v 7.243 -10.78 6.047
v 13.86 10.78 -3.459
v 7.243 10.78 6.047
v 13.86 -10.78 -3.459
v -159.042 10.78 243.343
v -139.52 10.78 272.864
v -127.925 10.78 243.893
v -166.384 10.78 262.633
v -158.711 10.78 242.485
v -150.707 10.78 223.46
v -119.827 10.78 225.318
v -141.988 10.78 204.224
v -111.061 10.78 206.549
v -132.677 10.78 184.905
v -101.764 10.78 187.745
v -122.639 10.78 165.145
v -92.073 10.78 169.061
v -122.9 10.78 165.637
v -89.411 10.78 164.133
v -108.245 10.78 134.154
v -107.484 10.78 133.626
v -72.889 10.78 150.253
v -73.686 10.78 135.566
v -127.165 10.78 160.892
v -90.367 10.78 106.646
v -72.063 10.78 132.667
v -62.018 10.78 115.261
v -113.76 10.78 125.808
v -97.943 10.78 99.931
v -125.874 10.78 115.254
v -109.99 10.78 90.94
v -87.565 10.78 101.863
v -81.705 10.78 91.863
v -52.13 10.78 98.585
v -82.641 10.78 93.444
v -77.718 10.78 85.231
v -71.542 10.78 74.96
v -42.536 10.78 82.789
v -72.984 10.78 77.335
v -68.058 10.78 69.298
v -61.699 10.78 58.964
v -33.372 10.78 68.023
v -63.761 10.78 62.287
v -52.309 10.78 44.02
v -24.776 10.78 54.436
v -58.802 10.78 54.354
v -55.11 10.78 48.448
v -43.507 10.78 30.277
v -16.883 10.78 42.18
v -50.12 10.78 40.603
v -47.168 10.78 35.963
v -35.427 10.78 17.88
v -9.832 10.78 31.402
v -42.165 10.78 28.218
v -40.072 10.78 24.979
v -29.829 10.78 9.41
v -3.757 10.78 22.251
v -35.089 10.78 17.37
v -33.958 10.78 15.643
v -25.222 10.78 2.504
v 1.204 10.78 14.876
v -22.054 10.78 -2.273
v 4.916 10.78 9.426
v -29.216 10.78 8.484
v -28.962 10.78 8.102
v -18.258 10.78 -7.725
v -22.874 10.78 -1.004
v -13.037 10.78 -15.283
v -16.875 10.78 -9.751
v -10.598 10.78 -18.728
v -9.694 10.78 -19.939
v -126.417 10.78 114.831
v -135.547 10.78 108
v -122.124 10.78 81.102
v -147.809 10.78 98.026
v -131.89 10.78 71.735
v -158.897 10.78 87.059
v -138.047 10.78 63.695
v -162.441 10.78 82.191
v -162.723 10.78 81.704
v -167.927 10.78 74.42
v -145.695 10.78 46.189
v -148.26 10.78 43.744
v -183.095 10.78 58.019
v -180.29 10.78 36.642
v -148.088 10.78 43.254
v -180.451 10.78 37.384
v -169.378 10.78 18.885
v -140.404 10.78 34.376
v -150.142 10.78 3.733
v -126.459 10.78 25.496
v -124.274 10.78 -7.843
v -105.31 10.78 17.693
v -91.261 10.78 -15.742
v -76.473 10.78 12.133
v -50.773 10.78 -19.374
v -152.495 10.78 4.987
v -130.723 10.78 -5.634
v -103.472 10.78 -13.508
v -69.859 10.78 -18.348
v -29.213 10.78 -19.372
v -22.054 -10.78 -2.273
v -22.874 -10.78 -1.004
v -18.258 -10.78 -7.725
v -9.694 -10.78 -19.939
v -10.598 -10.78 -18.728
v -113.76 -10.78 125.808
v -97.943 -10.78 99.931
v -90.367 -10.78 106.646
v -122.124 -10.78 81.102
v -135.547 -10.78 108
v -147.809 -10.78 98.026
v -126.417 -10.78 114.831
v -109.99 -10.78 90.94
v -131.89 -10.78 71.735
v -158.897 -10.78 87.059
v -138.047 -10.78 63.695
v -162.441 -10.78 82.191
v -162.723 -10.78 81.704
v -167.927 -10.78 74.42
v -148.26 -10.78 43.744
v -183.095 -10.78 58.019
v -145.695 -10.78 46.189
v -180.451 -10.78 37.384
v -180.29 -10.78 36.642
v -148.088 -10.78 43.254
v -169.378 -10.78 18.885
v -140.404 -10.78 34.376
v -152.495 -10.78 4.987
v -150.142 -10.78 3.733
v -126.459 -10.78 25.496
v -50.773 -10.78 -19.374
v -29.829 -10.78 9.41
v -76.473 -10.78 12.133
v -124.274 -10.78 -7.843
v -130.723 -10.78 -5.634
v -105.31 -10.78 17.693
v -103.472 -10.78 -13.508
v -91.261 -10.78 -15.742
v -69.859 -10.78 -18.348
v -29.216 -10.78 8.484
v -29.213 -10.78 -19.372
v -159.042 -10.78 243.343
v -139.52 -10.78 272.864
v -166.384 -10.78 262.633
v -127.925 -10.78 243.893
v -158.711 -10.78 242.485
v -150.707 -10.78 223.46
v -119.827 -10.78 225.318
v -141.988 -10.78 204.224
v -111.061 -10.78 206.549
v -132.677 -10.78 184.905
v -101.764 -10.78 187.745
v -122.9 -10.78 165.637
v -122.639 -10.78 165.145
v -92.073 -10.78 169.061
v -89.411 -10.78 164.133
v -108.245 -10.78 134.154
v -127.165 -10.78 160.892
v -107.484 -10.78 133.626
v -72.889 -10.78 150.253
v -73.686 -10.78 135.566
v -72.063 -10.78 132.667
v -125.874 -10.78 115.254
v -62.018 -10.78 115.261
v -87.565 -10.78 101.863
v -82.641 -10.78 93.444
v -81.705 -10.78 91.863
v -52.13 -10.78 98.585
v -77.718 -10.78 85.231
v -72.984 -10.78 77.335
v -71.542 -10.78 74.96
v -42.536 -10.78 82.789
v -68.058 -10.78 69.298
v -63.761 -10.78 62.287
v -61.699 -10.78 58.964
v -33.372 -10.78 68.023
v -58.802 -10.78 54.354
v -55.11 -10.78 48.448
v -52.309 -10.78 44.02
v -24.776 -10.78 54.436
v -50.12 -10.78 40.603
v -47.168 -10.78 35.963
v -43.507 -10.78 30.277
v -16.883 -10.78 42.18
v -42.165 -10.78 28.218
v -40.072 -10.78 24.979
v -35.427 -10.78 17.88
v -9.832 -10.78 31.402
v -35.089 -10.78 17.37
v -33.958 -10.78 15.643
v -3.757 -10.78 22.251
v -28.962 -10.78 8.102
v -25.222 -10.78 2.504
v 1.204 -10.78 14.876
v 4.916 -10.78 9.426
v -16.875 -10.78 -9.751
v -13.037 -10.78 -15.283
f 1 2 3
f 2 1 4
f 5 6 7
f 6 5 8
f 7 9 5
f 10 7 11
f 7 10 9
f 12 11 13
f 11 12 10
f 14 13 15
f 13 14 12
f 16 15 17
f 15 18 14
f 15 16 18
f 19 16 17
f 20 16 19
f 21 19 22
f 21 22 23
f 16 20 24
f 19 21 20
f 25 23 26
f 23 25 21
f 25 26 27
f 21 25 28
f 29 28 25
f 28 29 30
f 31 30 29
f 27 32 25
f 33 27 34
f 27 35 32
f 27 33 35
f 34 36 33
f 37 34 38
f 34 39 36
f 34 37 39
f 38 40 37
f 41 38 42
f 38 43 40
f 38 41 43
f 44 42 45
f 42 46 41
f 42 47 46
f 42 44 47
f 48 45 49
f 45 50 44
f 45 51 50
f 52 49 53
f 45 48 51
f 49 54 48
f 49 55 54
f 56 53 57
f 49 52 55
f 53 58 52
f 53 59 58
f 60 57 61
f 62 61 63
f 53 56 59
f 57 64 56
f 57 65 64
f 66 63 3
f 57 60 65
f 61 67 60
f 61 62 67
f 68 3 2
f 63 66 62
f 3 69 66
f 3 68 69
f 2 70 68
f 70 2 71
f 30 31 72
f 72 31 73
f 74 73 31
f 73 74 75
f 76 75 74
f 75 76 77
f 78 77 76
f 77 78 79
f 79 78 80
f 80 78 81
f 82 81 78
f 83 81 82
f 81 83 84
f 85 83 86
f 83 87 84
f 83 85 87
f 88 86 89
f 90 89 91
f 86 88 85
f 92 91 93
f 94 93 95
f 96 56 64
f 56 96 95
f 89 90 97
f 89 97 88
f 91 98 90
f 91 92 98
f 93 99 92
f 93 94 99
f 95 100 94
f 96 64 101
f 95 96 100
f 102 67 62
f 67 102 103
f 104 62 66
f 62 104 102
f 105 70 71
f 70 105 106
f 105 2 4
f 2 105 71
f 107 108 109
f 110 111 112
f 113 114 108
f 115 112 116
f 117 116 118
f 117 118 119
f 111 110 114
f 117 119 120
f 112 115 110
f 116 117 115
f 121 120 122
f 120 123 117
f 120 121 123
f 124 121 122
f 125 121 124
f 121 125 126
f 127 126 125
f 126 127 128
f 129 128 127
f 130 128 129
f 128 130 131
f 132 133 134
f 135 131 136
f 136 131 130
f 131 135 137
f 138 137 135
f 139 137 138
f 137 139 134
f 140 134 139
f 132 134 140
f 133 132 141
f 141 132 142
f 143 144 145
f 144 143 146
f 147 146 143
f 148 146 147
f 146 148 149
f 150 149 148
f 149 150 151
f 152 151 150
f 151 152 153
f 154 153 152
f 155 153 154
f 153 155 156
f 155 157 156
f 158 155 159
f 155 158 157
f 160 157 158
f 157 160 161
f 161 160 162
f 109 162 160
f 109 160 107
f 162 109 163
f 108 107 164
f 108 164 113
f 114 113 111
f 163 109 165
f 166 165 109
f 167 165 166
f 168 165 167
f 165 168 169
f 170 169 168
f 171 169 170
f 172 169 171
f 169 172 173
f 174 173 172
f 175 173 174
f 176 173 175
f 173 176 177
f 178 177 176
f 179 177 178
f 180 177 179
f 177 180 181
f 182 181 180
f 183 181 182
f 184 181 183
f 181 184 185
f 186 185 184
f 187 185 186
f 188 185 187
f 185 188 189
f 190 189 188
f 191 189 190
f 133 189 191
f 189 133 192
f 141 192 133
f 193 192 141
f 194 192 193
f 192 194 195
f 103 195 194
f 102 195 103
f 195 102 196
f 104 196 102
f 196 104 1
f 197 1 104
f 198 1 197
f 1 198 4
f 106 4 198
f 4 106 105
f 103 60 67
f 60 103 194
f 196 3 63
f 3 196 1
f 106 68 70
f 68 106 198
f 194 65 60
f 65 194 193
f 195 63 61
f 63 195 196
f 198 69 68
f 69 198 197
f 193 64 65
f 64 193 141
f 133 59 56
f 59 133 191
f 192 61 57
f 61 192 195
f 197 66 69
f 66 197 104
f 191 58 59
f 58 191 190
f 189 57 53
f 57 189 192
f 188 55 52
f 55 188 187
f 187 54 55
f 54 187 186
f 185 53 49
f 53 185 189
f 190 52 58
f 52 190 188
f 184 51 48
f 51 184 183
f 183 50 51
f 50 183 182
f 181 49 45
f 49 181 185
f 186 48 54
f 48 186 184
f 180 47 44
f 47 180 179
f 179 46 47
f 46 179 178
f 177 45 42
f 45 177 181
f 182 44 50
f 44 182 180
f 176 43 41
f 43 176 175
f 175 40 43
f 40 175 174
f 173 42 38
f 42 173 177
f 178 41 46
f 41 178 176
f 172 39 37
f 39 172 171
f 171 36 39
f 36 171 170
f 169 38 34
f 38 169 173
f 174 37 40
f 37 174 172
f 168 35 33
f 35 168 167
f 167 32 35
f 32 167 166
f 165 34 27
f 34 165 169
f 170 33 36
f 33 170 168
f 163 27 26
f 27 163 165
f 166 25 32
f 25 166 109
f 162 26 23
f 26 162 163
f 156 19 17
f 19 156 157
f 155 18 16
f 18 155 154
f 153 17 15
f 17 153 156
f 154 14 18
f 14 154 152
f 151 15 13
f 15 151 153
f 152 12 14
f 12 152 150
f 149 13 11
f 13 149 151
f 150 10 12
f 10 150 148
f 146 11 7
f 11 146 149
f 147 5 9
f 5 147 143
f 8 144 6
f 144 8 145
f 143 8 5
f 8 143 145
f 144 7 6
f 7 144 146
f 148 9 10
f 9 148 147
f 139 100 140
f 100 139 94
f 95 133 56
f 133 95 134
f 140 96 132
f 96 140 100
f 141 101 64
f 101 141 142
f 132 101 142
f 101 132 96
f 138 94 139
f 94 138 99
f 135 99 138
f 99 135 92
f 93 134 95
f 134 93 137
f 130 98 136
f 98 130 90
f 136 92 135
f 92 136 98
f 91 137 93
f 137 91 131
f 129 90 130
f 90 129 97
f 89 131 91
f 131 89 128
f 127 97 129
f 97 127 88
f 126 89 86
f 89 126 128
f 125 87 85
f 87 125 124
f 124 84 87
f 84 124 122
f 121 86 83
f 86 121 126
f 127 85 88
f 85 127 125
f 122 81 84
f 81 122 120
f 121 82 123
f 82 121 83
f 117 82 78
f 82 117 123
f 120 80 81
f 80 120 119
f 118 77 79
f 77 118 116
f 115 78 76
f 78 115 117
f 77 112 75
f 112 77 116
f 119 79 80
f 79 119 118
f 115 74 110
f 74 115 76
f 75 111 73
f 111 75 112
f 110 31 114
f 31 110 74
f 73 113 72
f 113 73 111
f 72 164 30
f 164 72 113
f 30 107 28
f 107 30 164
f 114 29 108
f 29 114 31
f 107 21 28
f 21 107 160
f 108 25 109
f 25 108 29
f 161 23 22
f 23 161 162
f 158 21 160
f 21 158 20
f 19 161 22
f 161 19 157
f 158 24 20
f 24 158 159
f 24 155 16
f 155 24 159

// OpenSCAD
// No Preview. Just hit Create.   Always leave Part at 1"
part=1;//[1,2,3,4,5,6]
/* [Hidden] */
LOA=rnd(900,2000);
Stern=LOA*rnd(-0.1,0.3);
Bow=LOA*rnd(-0.1,0.3);
Beam=LOA*rnd(0.05,0.3);
BeamHeight=min(Beam*rnd(0.4,1),LOA*0.1);
SternHeight=BeamHeight*rnd(0.9,3);
BowHeight=max(SternHeight*rnd(0.9,2),BeamHeight*rnd(0.9,3));;

KeelBase=LOA-Stern-Beam;
KeelLine=[
[0,0,0], 
[KeelBase*rnd(0.0,0.3),0,-KeelBase*rnd(-0.1,0.1)], 
[KeelBase*rnd(0.3,0.6),0,-KeelBase*rnd(-0.1,0.1)],
[KeelBase*rnd(0.6,0.9),0,-KeelBase*rnd(-0.1,0.1)],
[KeelBase-1,0,0],
[KeelBase-1,0,0]];
BottomLine=[
[0,0,0],
[KeelBase*rnd(0,0.3),Beam*rnd(0.1,1.5),1],
[KeelBase*rnd(0.3,0.6),Beam*rnd(0.1,2),1],
[KeelBase*rnd(0.6,0.9),Beam*rnd(0.1,3),1],
[KeelBase,0,1],
[KeelBase,0,1]];
bowbend=rnd(-1,3);
WaterLine=[
[-Stern*rnd(0.1,0.9),0,SternHeight/2],
[-Stern*rnd(0.1,0.9),Beam*rnd(0.5,2),SternHeight/2],
[KeelBase*rnd(0,2),Beam*rnd(0.5,3),BeamHeight/2],
[KeelBase+Bow*bowbend,0,BowHeight/2],
[KeelBase+Bow*bowbend,0,BowHeight/2]];
beamstern=[-Stern*rnd(-0.1,1),0,SternHeight];
BeamLine=[
beamstern,
[beamstern[0]+Beam*rnd(0,1),Beam*rnd(0.15,1.5),(BeamHeight+SternHeight)/2],
[KeelBase*rnd(0.0,0.5),Beam*rnd(0.15,2),BeamHeight],
[(KeelBase+Bow)*rnd(0.5,1),Beam*rnd(0.15,2),(BeamHeight+BowHeight)/2],
[KeelBase+Bow,0,BowHeight],
[KeelBase+Bow,0,BowHeight]];
KeelBow=concat(
[
BottomLine[len(BottomLine)-1],
WaterLine[len(WaterLine)-1],
BeamLine[len(BeamLine)-1]]);

SternLine=[BeamLine[0],WaterLine[0],BottomLine[0],KeelLine[0]];
RudderLine=[(WaterLine[0]+BeamLine[0])/2,WaterLine[0],WaterLine[0]-[LOA*rnd(0.03,0.2),0,0],BottomLine[0]-[LOA*rnd(0.03,0.2),0,0],KeelLine[0]-[LOA*rnd(0.01,0.03),0,0]];
tiny=[0.0001,0.0001,0.0001];
Clinked=rnd(0,1);
openhull=sign(rnd(-1,1));
nummasts= floor(rnd(0,4));
////////////////////////////////////////////////////////////////////////////////////////////////////////////////////////////////////////////////////////



  union(){
 masts(nummasts);
   * BoatHull(0,0,16,Clinked);
    }
//*render()
difference(){
    
    union(){
    if(floor(rnd(0,5))!=0 ||openhull<0){ Railings();}
    BoatHull(0,0,16,Clinked);
    }

    union(){
   if(floor(rnd(0,2))!=0){ Middeck();}
   
    translate(tiny)BoatHull(LOA/50,LOA/50*openhull,16);
    }
 

    }       
if (nummasts>0){
intersection(){    

    mirrorextrudeT(WaterLine,16,0.05,0.99){
    translate([0,-LOA/50,0]) scale(3) cube([LOA/1000,LOA/1000,LOA/200],center=true);
    }    
    
    BoatHull(LOA/400,0,10);
    }}
ctrl();

/////////////////////////////////////////////////////////////////////////////////////////////////////////////////////////////////////////////////////////////////////////////////////////////////////////////////////////////////
module Railings(){
    

mirrorcopy([0,-1,0]){
    extrudeT(BeamLine,16,0,1){
    translate([0,0,0]) scale(2.5) cylinder(LOA/100,LOA/300,LOA/300,center=true,$fn =6);
    }  }
    


extrudeT(KeelBow,16,-0.07,1){
    translate([0,0,-5]) scale(3) cube([LOA/200,LOA/150,LOA/150],center=true);
    }
/*extrudeT(KeelLine,16,0.25,0.91){
    translate([0,0,-5]) scale(3) cube([LOA/1000,LOA/150,LOA/300],center=true);
    }*/
!color("RED"){
extrudeT(SternLine,16,0,1.2){
    translate([0,0,-5]) scale(3) cube([LOA/200,LOA/200,LOA/150],center=true);
    }
    extrudeT(RudderLine,16,0,1.1){
    translate([0,0,-5]) scale(3) cube([LOA/200,LOA/200,LOA/150],center=true);
    }}
    
    intersection(){
    cube([LOA*2,LOA/50,LOA*2],center=true);
    BoatHull(-30,10,6);}
}
module masts(n=2){
       m=0.8/(n+0.5);
    i=len(WaterLine)-1 ;
    MastLine=[[max(WaterLine[0][0],BeamLine[0][0]),0,WaterLine[0][2]],[bez2(0.5, WaterLine)[0],0,bez2(0.5, WaterLine)[2]],[min(WaterLine[i][0],BeamLine[i][0]),0,WaterLine[i][2]]];
    
       for (s=[0.05+m:m:0.89]){
      p= bez2(s, MastLine);
       echo(p);
           MH=LOA*rnd(0.5,0.6)+Beam*rnd(0.2,0.2);th=MH*0.03;
   translate(p){   
       if (Beam<LOA*0.1){   cylinder(MH,th*0.5,th*0.2);
           translate([-th*0.25,0,bez2(s, BeamLine)[2]]) rotate([0,rnd(-5,5),-95]){ rotate([90,0,0])cylinder(KeelBase*m,th*0.5,th*0.3);   }}
           else{cylinder(MH,th*0.8,th*0.3);
   translate([th*0.5,0,MH*rnd(0.5,0.70)]) rotate([rnd(0,25),0,0])mirrorcopy([0,-1,0]){ rotate([90,0,0])cylinder(MH*0.5,th*0.5,th*0.3);   }}     
       }}}
    
module Middeck()
{   s=rnd(0.4,0.5);
   e=rnd(0.52,0.63); 
    bh=BeamHeight*rnd(0.3,0.5);
    hull(){
translate([bez2(s, BeamLine)[0],0,bez2(s, BeamLine)[2]])rotate([90,0,0])cylinder(Beam*4,bh,bh,center=true);
translate([bez2(midpoint(s,e), BeamLine)[0],0,bez2(midpoint(s,e), BeamLine)[2]])rotate([90,0,0])cylinder(Beam*4,bh,bh,center=true);
translate([bez2(e, BeamLine)[0],0,bez2(e, BeamLine)[2]])rotate([90,0,0])cylinder(Beam*4,bh,bh,center=true);}
    
    }
module BoatHull(offset=0,offset2=0,D=6,Clinker=0){
hstep=1/D;
vstep=1/(D*0.5);
    HLOA=LOA*0.5;
    offsetscale= (LOA-offset)/LOA;
    
   
for (t=[-0:hstep:1-hstep]){
spar1=[ bez2(t, BeamLine)+[0,0,-offset2],bez2(t, WaterLine),bez2(t, BottomLine),bez2(t, KeelLine)+[0,0,offset]];
spar2=[ bez2(t+hstep, BeamLine)+[0,0,-offset2],bez2(t+hstep, WaterLine),bez2(t+hstep, BottomLine),bez2(t+hstep, KeelLine)+[0,0,offset]];
  
for (v=[0:vstep:1-vstep]){
 
      
    p1=[((bez2(v, spar1)[0]-HLOA)*offsetscale)+HLOA,max(0,bez2(v, spar1)[1] ),bez2(v, spar1)[2]];
    p2=[((bez2(v+vstep, spar1)[0]-HLOA)*offsetscale)+HLOA,max(0,bez2(v+vstep, spar1)[1] ),bez2(v+vstep, spar1)[2]];
    p3=[((bez2(v, spar2)[0]-HLOA)*offsetscale)+HLOA,max(0,bez2(v, spar2)[1] ),bez2(v, spar2)[2]];
    p4=[((bez2(v+vstep, spar2)[0]-HLOA)*offsetscale)+HLOA,max(0,bez2(v+vstep, spar2)[1] ),bez2(v+vstep, spar2)[2]];
    
 p5=p2-[0,LOA/150,0]*SC3(v);
 p6=p4-[0,LOA/150,0]*SC3(v);
if (Clinker >0.5){
intersection(){
hull(){   
translate([0,-offset,0])polyhedron([p1,p5,p3,p6],[[0,2,1],[1,2,3,]]);
translate([0,-2000,0])polyhedron([p1,p5,p3,p6],[[0,2,1],[1,2,3,]]);
}
mirror([0,-1,0])hull(){
    {translate([0,-offset,0])polyhedron([p1,p5,p3,p6],[[0,2,1],[1,2,3,]]);
translate([0,-2000,0])polyhedron([p1,p5,p3,p6],[[0,2,1],[1,2,3,]]);
        }}}
    }
    else{
        
        intersection(){
hull(){   
translate([0,-offset,0])polyhedron([p1,p2,p3,p4],[[0,2,1],[1,2,3,]]);
translate([0,-2000,0])polyhedron([p1,p2,p3,p4],[[0,2,1],[1,2,3,]]);
}
mirror([0,-1,0])hull(){
    {translate([0,-offset,0])polyhedron([p1,p2,p3,p4],[[0,2,1],[1,2,3,]]);
translate([0,-2000,0])polyhedron([p1,p2,p3,p4],[[0,2,1],[1,2,3,]]);
        }}}
        
        
        
        }
    
}
}
    }
    
    module ctrl(){
        
        %color("RED"){mirror([0,-1,0]){

{ShowControl((BottomLine));
ShowControl((WaterLine));
ShowControl((BeamLine));}
}
{ShowControl((KeelLine));
ShowControl((BottomLine));
ShowControl((WaterLine));
ShowControl((BeamLine));}}}


module extrudeT(v,d=8,start=0,stop=1) {
         detail=1/d;
    for(i = [start+detail: detail: stop]) {
       for (j=[0:$children-1]) 
      hull() {
        translate(t(bez2(i,v))) rotate(bez2euler(i, v))scale(bez2(i  , v)[3]) children(j);
        translate(t(bez2(i - detail, v))) rotate(bez2euler(i - detail, v))scale(bez2(i- detail  , v)[3]) children(j);
      }
    }
  }

module mirrorextrudeT(v,d=8,start=0,stop=1) {
         detail=1/d;
    for(i = [start+detail: detail: stop]) {
       for (j=[0:$children-1]) 
      hull() {mirrorcopy([0,-1,0]){
        translate(t(bez2(i,v))) rotate(bez2euler(i, v))scale(bez2(i  , v)[3]) children(j);
        translate(t(bez2(i - detail, v))) rotate(bez2euler(i - detail, v))scale(bez2(i- detail  , v)[3]) children(j);
      }}
    }
  }

  module ShowControl(v)  
  {  // translate(t(v[0])) sphere(v[0][3]);
      for(i=[1:len(v)-1]){
       // vg  translate(t(v[i])) sphere(v[i][3]);
          hull(){
              translate(t(v[i])) sphere(0.5);
              translate(t(v[i-1])) sphere(0.5);
              }          }
      } 
      
      
      
module mirrorcopy(vec=[0,1,0]) 
{ 
    children(); 
    mirror(vec) children(); 
} 
   
 function  subdv(v)=[
  let(last=(len(v)-1)*3)
  for (i=[0:last])
      let(j=floor((i+1)/3))
  
  i%3 == 0?
    v[j]
  :
    i%3  == 2?
       v[j]- un(un(pre(v,j))+un(post(v,j)))*(len3(pre(v,j))+len3(post(v,j)))*0.1
        :
       v[j] +un(un(pre(v,j)) +un(post(v,j)))*(len3(pre(v,j))+len3(post(v,j)))*0.1
 
  ]
  ;     
 function bz2t(v,stop,precision=0.01,t=0,acc=0)=
    acc>=stop||t>1?
    t:
    bz2t(v,stop,precision,t+precision,acc+len3(bez2(t,v)-bez2(t+precision,v)));

function len3bz(v,precision=0.01,t=0,acc=0)=t>1?acc:len3bz(v,precision,t+precision,acc+len3(bez2(t,v)-bez2(t+precision,v)));

function bez2(t, v) = (len(v) > 2) ? bez2(t, [
  for(i = [0: len(v) - 2]) v[i] * t + v[i + 1] * (1 - t)
]): v[0] * t + v[1] * (1 - t);
function lim31(l, v) = v / len3(v) * l;
function len3(v) = sqrt(pow(v[0], 2) + pow(v[1], 2) + pow(v[2], 2));
function bez2euler(i, v) = [0, -asin(bez2v(i, v)[2]), atan2(bez2xy(bez2v(i, v))[1], bez2xy(bez2v(i, v))[0])];
  
function bez2xy(v) = lim31(1, [v[0], v[1], 0]); // down xy projection
function bez2v(i, v) = lim31(1, bez2(i - 0.0001, v) - bez2(i, v)); // unit vector at i
function t(v) = [v[0], v[1], v[2]];
function rndR()=[rands(0,360,1)[0],rands(0,360,1)[1],rands(0,360,1)[0]];
function rndV()=[rands(-1,1,1)[0],rands(-1,1,1)[0],rands(-1,1,1)[0]];
function midpoint(start,end) = start + (end  - start )/2;
function rndc()=[rands(0,1,1)[0],rands(0,1,1)[0],rands(0,1,1)[0]];     
      
      function rnd(a,b)=a+gauss(rands(0,1,1)[0])*(b-a);     

  function t(v) = [v[0], v[1], v[2]];

  
    function un(v) = v / max(len3(v),0.000001) * 1;
function len3(v) = sqrt(pow(v[0], 2) + pow(v[1], 2) + pow(v[2], 2));
  function pre(v,i)= i>0?         (v[i]-v[i-1]):[0,0,0,0];
  function post(v,i)=i<len(v)-1?  (v[i+1]-v[i]):[0,0,0,0] ;
  function SC3 (a)= let( b=clamp(a))(b * b * (3 - 2 * b));
  function clamp (a,b=0,c=10)=min(max(a,b),c);
function gauss(x)=x+(x-SC3(x))*2;;
